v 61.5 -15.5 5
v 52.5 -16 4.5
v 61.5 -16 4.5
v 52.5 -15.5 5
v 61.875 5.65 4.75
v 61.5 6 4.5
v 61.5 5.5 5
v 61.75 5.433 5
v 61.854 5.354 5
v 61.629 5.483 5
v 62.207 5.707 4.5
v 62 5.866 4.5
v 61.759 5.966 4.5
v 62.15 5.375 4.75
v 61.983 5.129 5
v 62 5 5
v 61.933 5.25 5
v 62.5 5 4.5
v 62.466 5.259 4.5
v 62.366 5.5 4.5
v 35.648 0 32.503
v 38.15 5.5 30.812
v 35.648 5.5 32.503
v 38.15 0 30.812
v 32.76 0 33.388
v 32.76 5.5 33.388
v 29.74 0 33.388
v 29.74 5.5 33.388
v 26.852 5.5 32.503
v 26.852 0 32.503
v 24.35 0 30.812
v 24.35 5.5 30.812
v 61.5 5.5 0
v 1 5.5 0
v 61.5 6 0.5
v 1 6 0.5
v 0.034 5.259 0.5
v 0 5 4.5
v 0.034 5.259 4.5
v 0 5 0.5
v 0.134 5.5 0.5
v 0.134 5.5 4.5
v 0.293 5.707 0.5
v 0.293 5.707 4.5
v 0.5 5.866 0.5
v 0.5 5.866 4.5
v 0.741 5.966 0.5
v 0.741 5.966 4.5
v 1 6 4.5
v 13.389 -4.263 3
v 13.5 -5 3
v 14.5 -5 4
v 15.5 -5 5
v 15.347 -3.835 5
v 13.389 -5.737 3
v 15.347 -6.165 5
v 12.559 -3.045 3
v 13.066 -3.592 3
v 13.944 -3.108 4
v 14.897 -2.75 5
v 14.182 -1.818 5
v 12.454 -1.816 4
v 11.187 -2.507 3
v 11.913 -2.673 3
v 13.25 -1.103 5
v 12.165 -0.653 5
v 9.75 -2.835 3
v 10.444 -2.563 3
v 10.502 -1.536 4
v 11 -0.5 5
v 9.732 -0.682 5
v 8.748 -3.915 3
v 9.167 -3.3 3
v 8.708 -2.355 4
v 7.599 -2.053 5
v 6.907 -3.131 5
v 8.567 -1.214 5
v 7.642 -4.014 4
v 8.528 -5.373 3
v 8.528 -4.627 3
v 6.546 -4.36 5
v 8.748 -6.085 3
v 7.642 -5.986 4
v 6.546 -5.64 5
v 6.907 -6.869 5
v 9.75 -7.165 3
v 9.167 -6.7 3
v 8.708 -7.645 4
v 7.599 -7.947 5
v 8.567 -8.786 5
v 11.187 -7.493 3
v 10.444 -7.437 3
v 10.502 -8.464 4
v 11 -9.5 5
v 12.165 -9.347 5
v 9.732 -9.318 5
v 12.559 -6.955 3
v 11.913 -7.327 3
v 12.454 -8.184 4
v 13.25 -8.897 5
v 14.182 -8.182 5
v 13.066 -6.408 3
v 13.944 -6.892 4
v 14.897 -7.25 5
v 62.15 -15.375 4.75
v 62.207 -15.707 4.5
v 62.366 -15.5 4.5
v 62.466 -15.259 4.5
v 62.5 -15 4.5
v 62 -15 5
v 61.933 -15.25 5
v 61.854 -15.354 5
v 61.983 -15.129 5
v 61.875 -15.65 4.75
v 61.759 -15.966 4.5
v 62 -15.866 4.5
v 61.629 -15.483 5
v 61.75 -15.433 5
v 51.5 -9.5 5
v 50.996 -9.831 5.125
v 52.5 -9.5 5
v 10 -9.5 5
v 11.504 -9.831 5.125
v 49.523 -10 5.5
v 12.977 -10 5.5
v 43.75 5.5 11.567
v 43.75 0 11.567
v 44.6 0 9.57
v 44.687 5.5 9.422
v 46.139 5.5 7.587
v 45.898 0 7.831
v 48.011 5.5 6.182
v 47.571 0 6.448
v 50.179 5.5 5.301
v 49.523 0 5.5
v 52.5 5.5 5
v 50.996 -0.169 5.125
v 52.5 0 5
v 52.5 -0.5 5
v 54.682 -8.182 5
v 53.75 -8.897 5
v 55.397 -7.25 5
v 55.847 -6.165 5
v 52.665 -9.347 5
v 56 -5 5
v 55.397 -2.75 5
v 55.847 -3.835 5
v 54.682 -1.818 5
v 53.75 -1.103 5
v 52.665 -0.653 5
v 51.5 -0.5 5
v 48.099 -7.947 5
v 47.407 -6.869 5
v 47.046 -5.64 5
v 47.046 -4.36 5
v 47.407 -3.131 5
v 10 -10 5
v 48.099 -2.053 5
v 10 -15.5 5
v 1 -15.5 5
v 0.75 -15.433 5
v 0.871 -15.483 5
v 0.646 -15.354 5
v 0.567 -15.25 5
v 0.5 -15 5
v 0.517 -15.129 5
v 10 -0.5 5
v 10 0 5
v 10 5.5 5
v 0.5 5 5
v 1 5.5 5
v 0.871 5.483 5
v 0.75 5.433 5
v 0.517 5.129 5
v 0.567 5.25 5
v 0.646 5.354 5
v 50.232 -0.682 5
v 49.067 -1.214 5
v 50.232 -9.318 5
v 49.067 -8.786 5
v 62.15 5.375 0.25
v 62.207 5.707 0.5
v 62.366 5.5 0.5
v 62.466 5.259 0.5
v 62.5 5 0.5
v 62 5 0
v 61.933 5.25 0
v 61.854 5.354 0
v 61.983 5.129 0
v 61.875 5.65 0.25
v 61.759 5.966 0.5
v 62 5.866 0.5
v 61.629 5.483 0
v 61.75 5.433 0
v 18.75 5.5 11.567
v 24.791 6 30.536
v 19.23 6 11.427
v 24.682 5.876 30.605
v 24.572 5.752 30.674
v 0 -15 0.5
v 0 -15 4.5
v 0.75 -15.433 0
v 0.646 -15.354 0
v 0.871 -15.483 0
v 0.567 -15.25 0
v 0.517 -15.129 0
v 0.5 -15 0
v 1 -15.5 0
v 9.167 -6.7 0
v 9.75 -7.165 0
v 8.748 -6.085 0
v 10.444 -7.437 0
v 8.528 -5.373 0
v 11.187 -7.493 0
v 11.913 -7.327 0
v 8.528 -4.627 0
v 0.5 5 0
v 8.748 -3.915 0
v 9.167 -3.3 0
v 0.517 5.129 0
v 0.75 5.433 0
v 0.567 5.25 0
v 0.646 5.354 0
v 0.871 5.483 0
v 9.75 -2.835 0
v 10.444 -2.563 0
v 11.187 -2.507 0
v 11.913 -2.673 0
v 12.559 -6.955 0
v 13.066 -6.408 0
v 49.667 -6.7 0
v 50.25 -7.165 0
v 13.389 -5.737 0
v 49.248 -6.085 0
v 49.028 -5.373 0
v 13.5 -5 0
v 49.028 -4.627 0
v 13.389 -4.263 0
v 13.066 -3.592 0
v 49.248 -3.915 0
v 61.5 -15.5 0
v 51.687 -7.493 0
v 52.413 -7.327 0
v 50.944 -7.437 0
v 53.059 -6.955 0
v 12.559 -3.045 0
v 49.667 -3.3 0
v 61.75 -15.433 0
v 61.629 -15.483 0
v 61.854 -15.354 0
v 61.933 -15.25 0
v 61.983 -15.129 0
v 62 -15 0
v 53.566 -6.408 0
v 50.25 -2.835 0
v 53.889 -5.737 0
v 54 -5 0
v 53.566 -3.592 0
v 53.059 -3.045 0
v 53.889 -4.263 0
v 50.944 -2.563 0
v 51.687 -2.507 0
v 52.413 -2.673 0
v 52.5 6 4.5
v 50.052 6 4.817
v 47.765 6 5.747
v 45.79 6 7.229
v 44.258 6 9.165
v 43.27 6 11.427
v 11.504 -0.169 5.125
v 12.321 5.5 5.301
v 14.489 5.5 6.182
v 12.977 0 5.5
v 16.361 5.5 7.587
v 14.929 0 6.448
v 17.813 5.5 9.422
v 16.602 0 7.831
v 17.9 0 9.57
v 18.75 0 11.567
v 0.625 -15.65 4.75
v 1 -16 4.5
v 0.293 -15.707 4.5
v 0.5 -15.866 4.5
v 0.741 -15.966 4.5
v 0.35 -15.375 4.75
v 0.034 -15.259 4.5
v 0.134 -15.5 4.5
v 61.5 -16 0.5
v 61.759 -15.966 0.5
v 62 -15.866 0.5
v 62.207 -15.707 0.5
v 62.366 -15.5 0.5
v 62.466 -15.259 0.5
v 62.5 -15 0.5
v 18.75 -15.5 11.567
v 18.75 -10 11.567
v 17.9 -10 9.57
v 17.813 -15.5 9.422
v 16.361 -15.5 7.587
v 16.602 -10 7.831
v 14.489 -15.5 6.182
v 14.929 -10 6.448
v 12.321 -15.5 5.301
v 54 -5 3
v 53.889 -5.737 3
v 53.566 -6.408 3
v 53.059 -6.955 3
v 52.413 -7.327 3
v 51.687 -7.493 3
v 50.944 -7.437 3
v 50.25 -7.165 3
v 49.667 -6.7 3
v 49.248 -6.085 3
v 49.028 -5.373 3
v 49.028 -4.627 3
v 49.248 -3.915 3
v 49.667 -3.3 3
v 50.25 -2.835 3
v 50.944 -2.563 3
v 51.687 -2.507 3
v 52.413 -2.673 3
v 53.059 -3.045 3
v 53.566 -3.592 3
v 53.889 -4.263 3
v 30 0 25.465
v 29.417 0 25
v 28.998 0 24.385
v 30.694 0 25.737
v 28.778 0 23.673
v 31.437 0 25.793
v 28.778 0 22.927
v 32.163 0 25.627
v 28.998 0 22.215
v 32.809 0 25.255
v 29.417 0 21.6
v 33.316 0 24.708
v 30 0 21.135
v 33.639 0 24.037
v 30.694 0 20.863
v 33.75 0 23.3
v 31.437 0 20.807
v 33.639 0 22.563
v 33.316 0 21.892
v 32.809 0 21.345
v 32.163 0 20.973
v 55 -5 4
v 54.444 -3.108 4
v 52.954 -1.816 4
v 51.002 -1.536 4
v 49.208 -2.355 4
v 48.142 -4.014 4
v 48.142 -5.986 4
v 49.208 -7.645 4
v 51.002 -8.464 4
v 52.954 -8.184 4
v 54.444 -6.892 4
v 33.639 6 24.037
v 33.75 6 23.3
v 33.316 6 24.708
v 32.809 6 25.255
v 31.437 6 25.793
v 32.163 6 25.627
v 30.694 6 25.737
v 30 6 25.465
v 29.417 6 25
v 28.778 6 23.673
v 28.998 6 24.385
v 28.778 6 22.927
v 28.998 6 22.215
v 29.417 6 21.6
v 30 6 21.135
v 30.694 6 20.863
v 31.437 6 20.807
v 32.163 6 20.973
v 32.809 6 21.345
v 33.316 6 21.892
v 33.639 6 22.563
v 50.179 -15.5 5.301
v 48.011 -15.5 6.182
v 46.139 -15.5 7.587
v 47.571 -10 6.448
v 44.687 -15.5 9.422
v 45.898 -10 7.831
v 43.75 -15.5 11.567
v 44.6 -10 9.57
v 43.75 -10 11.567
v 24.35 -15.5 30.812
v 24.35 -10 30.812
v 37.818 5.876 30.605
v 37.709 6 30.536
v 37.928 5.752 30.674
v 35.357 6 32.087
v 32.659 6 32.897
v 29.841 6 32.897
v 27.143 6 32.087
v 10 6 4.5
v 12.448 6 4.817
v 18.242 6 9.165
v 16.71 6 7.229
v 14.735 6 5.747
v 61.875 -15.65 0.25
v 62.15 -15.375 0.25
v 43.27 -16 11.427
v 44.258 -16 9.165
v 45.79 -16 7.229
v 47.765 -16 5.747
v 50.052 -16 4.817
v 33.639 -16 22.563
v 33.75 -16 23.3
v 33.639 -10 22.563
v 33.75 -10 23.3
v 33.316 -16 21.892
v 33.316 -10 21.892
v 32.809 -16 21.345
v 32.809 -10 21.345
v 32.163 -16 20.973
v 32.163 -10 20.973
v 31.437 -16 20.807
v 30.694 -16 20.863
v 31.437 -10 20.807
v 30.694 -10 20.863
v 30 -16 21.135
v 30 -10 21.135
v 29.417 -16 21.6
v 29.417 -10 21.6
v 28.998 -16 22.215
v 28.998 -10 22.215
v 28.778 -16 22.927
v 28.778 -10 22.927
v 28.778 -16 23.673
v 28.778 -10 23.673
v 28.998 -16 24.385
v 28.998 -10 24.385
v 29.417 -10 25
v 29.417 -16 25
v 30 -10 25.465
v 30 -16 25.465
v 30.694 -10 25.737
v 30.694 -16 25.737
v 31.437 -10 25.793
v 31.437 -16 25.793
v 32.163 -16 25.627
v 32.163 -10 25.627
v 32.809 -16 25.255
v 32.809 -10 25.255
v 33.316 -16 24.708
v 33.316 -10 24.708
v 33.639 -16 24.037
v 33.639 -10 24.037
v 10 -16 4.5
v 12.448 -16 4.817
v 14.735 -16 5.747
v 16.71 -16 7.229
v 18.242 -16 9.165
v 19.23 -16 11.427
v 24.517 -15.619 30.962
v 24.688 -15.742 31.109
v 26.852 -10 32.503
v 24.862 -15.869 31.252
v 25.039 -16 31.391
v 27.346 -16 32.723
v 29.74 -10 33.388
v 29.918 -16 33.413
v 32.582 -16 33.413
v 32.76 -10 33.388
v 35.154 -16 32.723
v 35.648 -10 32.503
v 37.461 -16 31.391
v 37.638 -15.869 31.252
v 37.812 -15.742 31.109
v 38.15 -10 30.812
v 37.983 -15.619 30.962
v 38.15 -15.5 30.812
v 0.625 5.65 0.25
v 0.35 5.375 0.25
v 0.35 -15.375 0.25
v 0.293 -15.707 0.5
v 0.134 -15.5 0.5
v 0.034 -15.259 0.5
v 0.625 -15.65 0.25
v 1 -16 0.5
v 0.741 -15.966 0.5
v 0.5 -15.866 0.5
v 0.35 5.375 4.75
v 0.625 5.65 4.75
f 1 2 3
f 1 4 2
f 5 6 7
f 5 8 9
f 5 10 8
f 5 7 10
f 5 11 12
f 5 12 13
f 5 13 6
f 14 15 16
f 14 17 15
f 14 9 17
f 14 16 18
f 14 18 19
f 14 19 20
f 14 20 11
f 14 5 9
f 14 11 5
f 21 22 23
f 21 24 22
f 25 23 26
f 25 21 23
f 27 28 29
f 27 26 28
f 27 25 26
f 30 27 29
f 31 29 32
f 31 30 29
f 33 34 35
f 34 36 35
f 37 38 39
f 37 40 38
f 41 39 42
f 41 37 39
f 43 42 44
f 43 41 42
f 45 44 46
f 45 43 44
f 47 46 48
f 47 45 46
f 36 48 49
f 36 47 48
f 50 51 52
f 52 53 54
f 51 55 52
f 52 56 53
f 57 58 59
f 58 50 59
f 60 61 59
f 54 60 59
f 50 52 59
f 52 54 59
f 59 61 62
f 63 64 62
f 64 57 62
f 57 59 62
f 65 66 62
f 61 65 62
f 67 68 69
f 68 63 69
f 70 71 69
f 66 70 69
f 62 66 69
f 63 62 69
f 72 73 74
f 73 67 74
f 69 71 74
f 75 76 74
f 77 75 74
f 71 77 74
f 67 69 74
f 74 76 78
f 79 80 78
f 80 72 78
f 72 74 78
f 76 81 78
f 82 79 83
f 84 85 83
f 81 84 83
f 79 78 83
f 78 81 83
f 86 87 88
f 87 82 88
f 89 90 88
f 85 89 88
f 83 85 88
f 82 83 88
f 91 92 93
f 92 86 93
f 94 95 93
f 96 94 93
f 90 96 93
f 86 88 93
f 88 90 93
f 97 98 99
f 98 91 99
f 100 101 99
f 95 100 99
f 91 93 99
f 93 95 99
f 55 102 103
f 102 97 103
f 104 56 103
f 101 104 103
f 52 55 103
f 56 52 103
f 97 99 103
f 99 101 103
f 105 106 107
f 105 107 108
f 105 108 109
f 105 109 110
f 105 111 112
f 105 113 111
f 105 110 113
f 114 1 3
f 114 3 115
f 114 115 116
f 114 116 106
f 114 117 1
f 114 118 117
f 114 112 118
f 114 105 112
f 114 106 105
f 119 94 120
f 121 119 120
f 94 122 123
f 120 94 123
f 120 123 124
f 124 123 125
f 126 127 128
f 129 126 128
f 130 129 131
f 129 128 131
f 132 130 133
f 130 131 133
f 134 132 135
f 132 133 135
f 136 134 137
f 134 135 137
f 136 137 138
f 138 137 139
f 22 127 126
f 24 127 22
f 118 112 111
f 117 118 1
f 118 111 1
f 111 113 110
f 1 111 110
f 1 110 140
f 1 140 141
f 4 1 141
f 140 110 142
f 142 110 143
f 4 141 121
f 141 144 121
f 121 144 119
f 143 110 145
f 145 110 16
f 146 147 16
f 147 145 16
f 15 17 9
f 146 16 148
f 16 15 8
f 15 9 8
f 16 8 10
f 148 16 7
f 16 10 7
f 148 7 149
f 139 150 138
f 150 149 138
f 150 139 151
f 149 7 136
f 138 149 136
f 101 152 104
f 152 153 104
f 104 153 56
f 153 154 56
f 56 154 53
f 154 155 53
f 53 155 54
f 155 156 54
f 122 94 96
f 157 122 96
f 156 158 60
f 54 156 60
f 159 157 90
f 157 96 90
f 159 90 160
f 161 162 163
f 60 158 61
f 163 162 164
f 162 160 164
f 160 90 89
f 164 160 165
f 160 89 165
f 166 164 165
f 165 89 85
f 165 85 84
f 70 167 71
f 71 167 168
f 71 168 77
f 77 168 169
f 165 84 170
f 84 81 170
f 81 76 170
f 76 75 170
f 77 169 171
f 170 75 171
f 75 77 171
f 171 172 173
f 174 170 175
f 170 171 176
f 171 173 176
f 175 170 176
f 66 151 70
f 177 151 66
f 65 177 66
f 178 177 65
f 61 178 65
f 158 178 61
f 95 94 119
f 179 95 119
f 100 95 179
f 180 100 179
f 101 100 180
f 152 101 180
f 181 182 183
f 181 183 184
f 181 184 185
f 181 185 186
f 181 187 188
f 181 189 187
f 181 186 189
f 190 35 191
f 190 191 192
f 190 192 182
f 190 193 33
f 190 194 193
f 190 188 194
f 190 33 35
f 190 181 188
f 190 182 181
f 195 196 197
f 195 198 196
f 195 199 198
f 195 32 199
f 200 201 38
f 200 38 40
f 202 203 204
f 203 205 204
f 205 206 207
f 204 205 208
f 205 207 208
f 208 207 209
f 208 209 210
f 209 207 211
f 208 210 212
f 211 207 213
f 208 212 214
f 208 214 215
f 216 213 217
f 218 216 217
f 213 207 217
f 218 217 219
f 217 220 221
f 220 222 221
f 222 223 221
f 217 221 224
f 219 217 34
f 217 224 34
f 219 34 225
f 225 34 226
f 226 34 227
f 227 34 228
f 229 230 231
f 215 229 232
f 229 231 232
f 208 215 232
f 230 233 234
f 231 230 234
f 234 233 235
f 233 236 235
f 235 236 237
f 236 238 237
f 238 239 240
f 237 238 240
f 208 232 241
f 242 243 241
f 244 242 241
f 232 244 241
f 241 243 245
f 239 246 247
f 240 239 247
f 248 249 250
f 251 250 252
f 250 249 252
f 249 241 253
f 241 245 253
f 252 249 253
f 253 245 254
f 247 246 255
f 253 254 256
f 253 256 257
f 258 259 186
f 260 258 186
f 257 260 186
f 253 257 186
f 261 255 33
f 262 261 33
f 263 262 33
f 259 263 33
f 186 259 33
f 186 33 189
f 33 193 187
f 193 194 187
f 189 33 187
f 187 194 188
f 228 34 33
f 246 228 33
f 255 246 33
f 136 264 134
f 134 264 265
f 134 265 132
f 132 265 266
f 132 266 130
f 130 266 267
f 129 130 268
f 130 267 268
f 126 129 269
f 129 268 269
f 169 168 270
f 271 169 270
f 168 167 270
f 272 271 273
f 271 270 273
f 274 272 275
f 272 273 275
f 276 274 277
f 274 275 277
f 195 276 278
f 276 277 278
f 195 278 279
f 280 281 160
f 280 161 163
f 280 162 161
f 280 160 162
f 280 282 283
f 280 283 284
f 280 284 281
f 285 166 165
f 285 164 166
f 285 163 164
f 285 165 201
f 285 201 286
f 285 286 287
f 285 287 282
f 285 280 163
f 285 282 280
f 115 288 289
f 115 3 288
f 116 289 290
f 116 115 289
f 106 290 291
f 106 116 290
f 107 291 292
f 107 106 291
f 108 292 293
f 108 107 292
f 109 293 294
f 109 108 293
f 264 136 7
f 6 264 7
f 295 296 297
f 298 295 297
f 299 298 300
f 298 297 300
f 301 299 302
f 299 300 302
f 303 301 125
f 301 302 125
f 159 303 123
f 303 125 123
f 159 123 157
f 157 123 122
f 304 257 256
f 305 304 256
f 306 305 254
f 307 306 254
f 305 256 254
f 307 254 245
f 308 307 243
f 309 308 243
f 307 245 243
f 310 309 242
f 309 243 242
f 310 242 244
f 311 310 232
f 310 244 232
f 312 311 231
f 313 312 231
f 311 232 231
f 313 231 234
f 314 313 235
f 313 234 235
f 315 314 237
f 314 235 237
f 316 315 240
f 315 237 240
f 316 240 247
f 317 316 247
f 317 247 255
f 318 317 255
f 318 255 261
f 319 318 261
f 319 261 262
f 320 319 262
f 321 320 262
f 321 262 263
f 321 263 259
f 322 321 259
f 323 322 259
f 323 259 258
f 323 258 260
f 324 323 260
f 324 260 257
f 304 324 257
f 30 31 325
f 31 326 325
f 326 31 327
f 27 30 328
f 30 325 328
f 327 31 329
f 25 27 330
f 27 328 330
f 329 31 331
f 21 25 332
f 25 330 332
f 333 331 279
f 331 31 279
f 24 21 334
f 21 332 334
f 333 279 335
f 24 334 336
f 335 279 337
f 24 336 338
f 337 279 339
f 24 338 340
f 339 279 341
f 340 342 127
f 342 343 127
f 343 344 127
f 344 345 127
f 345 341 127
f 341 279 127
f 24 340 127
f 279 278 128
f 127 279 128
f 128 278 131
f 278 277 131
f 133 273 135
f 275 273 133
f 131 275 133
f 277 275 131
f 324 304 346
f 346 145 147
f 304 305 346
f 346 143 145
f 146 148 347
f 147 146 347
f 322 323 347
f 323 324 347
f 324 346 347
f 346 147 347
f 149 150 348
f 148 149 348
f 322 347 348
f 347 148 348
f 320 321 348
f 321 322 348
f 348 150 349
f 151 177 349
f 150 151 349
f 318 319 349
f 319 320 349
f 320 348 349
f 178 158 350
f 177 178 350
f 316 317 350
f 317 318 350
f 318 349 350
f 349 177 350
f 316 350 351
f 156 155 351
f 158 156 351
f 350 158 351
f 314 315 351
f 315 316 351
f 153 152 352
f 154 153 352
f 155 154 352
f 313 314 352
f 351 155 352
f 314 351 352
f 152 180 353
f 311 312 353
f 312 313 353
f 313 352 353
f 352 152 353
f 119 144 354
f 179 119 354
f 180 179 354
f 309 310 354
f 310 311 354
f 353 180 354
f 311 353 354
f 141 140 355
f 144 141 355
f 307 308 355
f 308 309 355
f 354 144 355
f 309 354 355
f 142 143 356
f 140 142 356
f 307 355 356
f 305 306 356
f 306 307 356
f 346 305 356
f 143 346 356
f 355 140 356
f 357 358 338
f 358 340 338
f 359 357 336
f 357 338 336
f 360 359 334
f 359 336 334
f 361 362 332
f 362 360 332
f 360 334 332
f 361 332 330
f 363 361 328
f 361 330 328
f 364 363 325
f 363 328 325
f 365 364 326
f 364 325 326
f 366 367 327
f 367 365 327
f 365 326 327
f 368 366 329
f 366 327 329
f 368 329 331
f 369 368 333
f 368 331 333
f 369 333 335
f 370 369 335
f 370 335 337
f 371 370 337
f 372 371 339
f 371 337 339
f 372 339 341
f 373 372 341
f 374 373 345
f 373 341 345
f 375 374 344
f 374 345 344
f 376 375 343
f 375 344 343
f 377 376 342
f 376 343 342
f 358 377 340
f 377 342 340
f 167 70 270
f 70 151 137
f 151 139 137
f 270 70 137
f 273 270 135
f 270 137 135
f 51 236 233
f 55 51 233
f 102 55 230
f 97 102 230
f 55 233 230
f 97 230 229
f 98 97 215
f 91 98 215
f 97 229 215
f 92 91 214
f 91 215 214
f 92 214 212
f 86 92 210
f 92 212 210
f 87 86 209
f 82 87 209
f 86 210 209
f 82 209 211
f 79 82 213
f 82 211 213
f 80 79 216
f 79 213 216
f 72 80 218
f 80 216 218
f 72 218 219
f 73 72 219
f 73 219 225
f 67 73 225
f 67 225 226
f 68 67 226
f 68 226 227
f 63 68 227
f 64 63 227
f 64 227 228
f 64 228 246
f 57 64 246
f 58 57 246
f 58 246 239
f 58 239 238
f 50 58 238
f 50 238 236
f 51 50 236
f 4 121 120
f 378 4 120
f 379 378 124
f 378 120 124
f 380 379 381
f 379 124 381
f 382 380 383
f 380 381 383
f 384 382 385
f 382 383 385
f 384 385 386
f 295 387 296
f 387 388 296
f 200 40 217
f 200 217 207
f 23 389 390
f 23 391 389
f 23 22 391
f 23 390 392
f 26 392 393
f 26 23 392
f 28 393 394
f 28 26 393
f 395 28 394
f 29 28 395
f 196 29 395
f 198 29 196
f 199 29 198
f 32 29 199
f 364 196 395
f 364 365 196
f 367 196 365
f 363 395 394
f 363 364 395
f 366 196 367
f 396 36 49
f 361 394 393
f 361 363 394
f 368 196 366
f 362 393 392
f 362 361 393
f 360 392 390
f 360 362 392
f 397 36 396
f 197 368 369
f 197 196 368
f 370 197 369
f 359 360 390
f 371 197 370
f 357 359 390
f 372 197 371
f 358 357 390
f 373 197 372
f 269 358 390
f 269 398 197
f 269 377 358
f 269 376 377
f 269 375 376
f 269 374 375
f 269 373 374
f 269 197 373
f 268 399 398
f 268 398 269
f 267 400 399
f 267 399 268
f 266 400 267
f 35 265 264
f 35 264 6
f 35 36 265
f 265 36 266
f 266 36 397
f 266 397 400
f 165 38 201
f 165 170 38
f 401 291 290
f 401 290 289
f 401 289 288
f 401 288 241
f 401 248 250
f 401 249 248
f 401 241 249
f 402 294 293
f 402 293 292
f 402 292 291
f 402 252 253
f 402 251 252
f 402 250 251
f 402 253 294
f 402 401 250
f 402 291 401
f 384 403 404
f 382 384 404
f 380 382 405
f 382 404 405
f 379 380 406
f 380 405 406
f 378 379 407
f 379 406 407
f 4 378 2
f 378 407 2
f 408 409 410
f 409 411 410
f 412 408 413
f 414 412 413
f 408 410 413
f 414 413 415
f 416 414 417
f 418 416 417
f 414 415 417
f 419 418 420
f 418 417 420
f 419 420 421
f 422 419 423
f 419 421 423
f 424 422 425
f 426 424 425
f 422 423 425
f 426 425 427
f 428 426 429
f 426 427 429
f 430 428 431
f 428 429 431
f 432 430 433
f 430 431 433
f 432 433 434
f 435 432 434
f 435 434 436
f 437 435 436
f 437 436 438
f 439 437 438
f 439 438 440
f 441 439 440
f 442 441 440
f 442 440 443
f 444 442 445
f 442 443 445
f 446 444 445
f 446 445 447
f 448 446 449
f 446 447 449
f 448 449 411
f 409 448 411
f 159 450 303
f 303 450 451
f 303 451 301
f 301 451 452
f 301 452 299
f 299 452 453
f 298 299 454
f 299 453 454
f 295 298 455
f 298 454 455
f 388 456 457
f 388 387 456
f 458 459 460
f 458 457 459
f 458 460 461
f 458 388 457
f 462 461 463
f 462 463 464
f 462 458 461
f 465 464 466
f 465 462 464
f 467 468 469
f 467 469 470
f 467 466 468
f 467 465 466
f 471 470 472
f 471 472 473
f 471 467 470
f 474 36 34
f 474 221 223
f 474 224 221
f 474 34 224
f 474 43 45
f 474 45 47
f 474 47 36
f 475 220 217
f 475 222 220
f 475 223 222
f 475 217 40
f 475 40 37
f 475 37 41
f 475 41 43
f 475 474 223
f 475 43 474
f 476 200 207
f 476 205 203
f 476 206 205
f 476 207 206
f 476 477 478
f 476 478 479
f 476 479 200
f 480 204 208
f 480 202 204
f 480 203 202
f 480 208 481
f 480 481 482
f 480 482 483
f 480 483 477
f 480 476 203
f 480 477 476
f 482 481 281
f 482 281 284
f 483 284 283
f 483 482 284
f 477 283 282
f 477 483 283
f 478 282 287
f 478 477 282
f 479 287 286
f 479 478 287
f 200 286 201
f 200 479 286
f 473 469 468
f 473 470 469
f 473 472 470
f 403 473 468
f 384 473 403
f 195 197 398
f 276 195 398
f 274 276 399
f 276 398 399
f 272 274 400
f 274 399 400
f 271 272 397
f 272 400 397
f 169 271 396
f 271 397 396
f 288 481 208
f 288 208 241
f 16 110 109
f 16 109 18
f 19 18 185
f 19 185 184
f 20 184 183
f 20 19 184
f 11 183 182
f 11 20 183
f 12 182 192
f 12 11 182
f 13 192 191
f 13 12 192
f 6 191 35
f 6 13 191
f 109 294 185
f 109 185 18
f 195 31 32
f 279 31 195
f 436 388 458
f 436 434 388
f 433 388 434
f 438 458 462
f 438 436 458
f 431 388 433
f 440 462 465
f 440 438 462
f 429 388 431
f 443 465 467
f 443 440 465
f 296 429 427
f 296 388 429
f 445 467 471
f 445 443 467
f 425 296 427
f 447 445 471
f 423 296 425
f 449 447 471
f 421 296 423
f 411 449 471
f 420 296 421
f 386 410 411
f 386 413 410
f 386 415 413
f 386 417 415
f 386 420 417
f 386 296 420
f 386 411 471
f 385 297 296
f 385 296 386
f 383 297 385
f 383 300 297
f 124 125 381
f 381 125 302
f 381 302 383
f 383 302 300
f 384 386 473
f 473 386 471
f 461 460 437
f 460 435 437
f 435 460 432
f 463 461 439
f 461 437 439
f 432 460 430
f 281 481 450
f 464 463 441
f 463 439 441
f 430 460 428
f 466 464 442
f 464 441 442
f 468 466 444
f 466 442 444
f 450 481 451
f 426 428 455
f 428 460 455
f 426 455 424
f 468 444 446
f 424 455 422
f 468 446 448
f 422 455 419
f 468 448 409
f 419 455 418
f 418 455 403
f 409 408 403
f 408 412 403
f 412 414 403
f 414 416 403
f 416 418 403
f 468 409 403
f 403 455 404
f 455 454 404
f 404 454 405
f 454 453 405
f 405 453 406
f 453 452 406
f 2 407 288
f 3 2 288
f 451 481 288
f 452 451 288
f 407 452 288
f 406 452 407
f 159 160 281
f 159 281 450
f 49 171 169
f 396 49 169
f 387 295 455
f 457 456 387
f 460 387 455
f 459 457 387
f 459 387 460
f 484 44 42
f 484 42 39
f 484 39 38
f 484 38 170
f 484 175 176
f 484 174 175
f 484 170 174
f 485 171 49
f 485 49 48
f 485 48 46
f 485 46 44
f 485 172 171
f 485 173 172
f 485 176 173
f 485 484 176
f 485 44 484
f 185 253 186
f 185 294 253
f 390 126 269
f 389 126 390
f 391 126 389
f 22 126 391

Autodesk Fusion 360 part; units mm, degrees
sketch "Sketch1" plane through (0, 0, 0) normal (0, 1, 0) x (1, 0, 0)
  line L0 (0, 0) -> (62.5, 0)
  line L1 (62.5, 0) -> (62.5, -5)
  line L2 (62.5, -5) -> (52.5, -5)
  arc A0 (52.5, -5) -> (43.75, -11.5668) centre (52.5, -14.1129) ccw
  line L3 (43.75, -11.5668) -> (38.15, -30.812)
  arc A1 (24.35, -30.812) -> (38.15, -30.812) centre (31.25, -23.3) ccw
  line L4 (24.35, -30.812) -> (18.75, -11.5668)
  arc A2 (18.75, -11.5668) -> (10, -5) centre (10, -14.1129) ccw
  line L5 (10, -5) -> (0, -5)
  line L6 (0, -5) -> (0, 0)
  circle A3 centre (31.25, -23.3) radius 2.5
  line L7 (24.35, -30.812) -> (38.15, -30.812) construction
  line L8 (31.25, -33.5) -> (31.25, -23.3) construction
  line L9 (10, -5) -> (52.5, -5)
  dimension "d1" = 13.8
  dimension "d2" = 7.7
  dimension "d3" = 5
  dimension "d5" = 5
  dimension "d8" = 62.5
  dimension "d29" = 33.5
  dimension "d30" = 25
  dimension "d31" = 10
extrude "Extrude1" add sketch "Sketch1" along normal blind 6
extrude "Extrude2" add sketch "Sketch1" against normal blind 10 contours L0 L1 L2 L5 L6 L9
extrude "Extrude3" add 1 faces at (31.3123, 6, 14.6469) along direction (0, -1, 0) blind 6 from surface at 16
fillet "Fillet1" radius 1 4 edges at (0, -16, 2.5) (62.5, -16, 2.5) (62.5, 6, 2.5) (0, 6, 2.5)
sketch "Sketch2" plane through (0, 0, 0) normal (0, 0, -1) x (1, 0, 0)
  arc A0 (0, -5) -> (1, -6) centre (1, -5) ccw
  line L0 (1, -6) -> (61.5, -6)
  arc A1 (61.5, -6) -> (62.5, -5) centre (61.5, -5) ccw
  line L1 (62.5, -5) -> (62.5, 15)
  arc A2 (62.5, 15) -> (61.5, 16) centre (61.5, 15) ccw
  line L2 (61.5, 16) -> (1, 16)
  arc A3 (1, 16) -> (0, 15) centre (1, 15) ccw
  line L3 (0, 15) -> (0, -5)
  line L4 (0, 5) -> (62.5, 5) construction
  circle A4 centre (11, 5) radius 2.5
  circle A5 centre (51.5, 5) radius 2.5
  line L5 (31.25, 5) -> (31.25, 16) construction
  dimension "d20" = 40.5
  dimension "d21" = 5
extrude "Extrude4" cut sketch "Sketch2" against normal blind 7 contours A4 | A5
chamfer "Chamfer1" distance 2 angle 45 2 edges at (8.6692, -4.096, 5) (49.1692, -4.096, 5)
chamfer "Chamfer2" distance 0.5 angle 45 27 edges at (40.95, 6, 21.1894) (47.03, 6, 6.8243) (57, 6, 5) (62.2071, 5.7071, 5) (62.5, -5, 5) (62.2071, -15.7071, 5) (57, -16, 5) (47.03, -16, 6.8243) (40.95, -16, 21.1894) (21.55, 6, 21.1894) (21.55, -16, 21.1894) (15.47, -16, 6.8243) (5.5, -16, 5) (0.2929, -15.7071, 5) (0, -5, 5) (0.2929, 5.7071, 5) (5.5, 6, 5) (15.47, 6, 6.8243) (31.25, 6, 33.5) (31.25, 6, 0) (0.2929, 5.7071, 0) (0, -5, 0) (0.2929, -15.7071, 0) (31.25, -16, 0) (62.2071, -15.7071, 0) (62.5, -5, 0) (62.2071, 5.7071, 0)
fillet "Fillet3" radius 0.5 2 edges at (31.25, -10, 5) (31.25, 0, 5)
